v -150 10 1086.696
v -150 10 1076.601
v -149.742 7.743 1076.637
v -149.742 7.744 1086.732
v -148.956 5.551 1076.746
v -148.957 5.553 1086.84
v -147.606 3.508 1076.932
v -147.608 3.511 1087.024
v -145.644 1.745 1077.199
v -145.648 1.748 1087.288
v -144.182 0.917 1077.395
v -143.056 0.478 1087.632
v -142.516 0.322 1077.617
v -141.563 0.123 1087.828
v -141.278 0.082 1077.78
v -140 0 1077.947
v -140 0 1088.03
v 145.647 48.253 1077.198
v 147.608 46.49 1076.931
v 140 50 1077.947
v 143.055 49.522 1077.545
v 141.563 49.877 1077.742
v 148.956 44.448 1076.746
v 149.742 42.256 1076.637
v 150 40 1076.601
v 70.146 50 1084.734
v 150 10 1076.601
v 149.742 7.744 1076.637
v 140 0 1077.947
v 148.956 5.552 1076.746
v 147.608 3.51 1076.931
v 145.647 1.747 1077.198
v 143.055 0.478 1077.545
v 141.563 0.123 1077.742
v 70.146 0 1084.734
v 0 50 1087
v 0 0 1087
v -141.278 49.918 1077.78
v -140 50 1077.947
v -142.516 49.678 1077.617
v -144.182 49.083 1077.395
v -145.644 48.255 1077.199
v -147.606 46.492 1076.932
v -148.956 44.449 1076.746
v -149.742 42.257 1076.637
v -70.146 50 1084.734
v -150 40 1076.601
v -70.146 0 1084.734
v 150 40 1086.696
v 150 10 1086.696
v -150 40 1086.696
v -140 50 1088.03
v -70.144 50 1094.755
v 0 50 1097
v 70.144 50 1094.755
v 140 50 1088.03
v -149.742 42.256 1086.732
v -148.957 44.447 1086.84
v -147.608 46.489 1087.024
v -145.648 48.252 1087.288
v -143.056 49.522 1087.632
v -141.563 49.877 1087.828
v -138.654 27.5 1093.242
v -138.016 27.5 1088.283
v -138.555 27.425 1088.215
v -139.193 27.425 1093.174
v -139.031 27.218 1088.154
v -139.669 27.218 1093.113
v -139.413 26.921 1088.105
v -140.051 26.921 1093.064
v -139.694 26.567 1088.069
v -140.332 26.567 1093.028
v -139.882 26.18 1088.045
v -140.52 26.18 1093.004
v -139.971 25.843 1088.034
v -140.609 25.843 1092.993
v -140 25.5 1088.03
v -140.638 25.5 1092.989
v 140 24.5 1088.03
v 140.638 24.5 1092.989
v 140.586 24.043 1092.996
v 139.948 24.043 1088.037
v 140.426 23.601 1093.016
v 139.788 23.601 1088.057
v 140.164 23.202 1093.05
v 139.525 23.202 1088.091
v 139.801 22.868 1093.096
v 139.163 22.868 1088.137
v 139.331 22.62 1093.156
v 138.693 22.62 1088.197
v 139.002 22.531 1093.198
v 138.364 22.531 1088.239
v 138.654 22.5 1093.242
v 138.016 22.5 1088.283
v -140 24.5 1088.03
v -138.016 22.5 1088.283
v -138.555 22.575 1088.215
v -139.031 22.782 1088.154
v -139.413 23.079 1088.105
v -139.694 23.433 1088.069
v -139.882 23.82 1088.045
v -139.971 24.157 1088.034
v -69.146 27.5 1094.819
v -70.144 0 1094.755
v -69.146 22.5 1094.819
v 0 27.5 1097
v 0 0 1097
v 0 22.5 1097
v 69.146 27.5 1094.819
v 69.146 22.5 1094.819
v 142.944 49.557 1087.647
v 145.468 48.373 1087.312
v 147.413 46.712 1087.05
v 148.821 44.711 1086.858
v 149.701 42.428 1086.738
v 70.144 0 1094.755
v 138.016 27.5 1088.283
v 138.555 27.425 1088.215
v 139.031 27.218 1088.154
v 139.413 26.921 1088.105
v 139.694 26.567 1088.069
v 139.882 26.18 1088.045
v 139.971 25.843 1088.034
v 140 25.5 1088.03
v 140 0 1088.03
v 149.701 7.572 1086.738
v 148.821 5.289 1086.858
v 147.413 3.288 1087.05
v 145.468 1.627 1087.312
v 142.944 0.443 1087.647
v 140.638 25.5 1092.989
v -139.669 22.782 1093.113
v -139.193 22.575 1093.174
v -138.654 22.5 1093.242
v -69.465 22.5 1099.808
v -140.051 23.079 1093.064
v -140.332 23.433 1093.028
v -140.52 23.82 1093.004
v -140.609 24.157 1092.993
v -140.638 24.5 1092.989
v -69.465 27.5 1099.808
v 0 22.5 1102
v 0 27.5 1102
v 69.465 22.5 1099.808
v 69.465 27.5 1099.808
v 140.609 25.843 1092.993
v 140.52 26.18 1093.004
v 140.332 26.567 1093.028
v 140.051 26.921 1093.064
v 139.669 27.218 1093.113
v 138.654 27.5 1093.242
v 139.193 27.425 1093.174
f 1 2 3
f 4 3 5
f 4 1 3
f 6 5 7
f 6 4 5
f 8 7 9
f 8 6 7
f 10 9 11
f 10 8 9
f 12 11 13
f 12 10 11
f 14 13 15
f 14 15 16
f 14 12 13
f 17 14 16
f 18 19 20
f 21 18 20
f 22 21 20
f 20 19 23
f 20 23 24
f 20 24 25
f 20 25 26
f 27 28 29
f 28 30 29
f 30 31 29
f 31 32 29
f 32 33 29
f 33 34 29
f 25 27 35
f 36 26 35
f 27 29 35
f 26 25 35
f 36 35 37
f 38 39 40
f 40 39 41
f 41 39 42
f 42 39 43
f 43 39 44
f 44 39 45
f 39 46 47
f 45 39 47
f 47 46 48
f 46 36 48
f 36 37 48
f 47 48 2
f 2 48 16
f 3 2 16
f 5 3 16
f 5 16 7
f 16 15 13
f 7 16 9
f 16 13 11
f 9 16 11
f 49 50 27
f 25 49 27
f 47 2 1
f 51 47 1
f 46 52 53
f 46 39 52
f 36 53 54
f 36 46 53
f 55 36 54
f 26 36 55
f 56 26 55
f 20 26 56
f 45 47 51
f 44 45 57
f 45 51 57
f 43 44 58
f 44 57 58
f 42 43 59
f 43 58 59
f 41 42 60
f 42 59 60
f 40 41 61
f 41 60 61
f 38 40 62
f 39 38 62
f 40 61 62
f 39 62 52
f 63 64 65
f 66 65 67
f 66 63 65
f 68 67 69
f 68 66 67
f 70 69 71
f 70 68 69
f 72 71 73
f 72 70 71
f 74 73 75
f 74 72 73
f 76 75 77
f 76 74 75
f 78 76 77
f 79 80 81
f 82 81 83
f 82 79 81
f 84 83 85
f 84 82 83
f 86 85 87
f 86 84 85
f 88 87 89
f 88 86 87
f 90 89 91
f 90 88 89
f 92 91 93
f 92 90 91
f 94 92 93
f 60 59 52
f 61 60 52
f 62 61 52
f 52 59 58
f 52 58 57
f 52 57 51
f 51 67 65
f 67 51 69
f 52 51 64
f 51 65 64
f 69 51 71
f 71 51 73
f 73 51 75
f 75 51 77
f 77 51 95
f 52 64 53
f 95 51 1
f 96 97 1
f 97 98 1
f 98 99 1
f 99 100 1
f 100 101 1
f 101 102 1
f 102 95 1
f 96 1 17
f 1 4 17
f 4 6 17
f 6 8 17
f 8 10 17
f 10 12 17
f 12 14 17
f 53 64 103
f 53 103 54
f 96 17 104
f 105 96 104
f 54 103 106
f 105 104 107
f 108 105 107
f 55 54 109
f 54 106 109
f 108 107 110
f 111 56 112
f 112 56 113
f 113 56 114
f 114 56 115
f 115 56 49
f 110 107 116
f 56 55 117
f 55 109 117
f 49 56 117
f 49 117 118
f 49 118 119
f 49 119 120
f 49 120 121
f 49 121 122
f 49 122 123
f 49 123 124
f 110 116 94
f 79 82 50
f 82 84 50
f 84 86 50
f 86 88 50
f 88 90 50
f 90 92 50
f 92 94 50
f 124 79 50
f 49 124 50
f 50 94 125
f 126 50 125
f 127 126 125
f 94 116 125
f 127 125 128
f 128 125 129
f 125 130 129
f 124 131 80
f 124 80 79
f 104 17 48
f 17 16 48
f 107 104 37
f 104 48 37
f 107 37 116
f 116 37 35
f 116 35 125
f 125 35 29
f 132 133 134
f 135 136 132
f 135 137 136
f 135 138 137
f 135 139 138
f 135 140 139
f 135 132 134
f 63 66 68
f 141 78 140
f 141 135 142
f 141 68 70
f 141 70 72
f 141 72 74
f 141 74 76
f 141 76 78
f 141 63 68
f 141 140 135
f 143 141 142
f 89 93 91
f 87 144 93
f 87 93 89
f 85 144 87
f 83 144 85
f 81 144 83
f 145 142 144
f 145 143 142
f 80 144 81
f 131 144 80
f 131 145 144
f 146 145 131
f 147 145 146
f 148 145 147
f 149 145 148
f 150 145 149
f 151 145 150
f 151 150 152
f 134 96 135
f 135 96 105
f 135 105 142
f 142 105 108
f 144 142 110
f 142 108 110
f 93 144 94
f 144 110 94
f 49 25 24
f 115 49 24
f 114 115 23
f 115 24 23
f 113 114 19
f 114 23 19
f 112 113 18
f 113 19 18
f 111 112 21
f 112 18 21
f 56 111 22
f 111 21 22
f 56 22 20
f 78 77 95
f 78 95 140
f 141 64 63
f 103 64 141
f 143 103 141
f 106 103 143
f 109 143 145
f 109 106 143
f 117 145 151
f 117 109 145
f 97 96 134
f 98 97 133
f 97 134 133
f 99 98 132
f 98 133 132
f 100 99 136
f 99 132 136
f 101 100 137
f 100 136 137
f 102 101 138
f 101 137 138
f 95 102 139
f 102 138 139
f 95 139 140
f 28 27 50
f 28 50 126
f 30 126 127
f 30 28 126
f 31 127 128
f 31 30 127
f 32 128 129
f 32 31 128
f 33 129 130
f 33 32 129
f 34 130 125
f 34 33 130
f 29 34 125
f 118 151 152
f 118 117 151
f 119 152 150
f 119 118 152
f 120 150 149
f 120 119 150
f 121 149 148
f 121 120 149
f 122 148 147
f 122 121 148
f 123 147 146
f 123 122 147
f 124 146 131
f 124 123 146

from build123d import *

# Parameters (mm, degrees)
BOSS_EXTRUDE1_DEPTH = 50
FILLET1_R           = 10
BOSS_EXTRUDE2_DEPTH = 2.5
FILLET3_R           = 2


with BuildPart() as part:
    # Sketch1 → Boss-Extrude1 (new body)
    with BuildSketch(Plane(origin=(0, 0, 0), x_dir=(1, 0, 0), z_dir=(0, 1, 0))):
        with BuildLine():
            Line((-150, -1076.600668772), (-150, -1086.696369737))
            ThreePointArc((-150, -1086.696369737), (0, -1097), (150, -1086.696369737))
            Line((150, -1086.696369737), (150, -1076.600668772))
            ThreePointArc((150, -1076.600668772), (0, -1087), (-150, -1076.600668772))
        make_face()
    extrude(amount=BOSS_EXTRUDE1_DEPTH)

    # Fillet1
    fillet1_edges = [part.edges().sort_by_distance(p)[0] for p in [
        (150, 50, 1081.648519255),
        (150, 0, 1081.648519255),
        (-150, 0, 1081.648519255),
        (-150, 50, 1081.648519255),
    ]]
    fillet(fillet1_edges, radius=FILLET1_R)

    # Sketch3 → Boss-Extrude2 (add, symmetric)
    with BuildSketch(Plane(origin=(0, 25, 0), x_dir=(1, 0, 0), z_dir=(0, 1, 0))):
        with BuildLine():
            Line((-140, -1088.029870913), (-140.63810392, -1092.988986095))
            ThreePointArc((-140.63810392, -1092.988986095), (0, -1102), (140.63810392, -1092.988986095))
            Line((140.63810392, -1092.988986095), (140, -1088.029870913))
            ThreePointArc((140, -1088.029870913), (0, -1097), (-140, -1088.029870913))
        make_face()
    extrude(amount=BOSS_EXTRUDE2_DEPTH, both=True)

    # Fillet3
    fillet3_edges = [part.edges().sort_by_distance(p)[0] for p in [
        (-140.31905196, 22.5, 1090.509428504),
        (140.31905196, 22.5, 1090.509428504),
        (-140.31905196, 27.5, 1090.509428504),
        (140.31905196, 27.5, 1090.509428504),
    ]]
    fillet(fillet3_edges, radius=FILLET3_R)


solid = part.part
